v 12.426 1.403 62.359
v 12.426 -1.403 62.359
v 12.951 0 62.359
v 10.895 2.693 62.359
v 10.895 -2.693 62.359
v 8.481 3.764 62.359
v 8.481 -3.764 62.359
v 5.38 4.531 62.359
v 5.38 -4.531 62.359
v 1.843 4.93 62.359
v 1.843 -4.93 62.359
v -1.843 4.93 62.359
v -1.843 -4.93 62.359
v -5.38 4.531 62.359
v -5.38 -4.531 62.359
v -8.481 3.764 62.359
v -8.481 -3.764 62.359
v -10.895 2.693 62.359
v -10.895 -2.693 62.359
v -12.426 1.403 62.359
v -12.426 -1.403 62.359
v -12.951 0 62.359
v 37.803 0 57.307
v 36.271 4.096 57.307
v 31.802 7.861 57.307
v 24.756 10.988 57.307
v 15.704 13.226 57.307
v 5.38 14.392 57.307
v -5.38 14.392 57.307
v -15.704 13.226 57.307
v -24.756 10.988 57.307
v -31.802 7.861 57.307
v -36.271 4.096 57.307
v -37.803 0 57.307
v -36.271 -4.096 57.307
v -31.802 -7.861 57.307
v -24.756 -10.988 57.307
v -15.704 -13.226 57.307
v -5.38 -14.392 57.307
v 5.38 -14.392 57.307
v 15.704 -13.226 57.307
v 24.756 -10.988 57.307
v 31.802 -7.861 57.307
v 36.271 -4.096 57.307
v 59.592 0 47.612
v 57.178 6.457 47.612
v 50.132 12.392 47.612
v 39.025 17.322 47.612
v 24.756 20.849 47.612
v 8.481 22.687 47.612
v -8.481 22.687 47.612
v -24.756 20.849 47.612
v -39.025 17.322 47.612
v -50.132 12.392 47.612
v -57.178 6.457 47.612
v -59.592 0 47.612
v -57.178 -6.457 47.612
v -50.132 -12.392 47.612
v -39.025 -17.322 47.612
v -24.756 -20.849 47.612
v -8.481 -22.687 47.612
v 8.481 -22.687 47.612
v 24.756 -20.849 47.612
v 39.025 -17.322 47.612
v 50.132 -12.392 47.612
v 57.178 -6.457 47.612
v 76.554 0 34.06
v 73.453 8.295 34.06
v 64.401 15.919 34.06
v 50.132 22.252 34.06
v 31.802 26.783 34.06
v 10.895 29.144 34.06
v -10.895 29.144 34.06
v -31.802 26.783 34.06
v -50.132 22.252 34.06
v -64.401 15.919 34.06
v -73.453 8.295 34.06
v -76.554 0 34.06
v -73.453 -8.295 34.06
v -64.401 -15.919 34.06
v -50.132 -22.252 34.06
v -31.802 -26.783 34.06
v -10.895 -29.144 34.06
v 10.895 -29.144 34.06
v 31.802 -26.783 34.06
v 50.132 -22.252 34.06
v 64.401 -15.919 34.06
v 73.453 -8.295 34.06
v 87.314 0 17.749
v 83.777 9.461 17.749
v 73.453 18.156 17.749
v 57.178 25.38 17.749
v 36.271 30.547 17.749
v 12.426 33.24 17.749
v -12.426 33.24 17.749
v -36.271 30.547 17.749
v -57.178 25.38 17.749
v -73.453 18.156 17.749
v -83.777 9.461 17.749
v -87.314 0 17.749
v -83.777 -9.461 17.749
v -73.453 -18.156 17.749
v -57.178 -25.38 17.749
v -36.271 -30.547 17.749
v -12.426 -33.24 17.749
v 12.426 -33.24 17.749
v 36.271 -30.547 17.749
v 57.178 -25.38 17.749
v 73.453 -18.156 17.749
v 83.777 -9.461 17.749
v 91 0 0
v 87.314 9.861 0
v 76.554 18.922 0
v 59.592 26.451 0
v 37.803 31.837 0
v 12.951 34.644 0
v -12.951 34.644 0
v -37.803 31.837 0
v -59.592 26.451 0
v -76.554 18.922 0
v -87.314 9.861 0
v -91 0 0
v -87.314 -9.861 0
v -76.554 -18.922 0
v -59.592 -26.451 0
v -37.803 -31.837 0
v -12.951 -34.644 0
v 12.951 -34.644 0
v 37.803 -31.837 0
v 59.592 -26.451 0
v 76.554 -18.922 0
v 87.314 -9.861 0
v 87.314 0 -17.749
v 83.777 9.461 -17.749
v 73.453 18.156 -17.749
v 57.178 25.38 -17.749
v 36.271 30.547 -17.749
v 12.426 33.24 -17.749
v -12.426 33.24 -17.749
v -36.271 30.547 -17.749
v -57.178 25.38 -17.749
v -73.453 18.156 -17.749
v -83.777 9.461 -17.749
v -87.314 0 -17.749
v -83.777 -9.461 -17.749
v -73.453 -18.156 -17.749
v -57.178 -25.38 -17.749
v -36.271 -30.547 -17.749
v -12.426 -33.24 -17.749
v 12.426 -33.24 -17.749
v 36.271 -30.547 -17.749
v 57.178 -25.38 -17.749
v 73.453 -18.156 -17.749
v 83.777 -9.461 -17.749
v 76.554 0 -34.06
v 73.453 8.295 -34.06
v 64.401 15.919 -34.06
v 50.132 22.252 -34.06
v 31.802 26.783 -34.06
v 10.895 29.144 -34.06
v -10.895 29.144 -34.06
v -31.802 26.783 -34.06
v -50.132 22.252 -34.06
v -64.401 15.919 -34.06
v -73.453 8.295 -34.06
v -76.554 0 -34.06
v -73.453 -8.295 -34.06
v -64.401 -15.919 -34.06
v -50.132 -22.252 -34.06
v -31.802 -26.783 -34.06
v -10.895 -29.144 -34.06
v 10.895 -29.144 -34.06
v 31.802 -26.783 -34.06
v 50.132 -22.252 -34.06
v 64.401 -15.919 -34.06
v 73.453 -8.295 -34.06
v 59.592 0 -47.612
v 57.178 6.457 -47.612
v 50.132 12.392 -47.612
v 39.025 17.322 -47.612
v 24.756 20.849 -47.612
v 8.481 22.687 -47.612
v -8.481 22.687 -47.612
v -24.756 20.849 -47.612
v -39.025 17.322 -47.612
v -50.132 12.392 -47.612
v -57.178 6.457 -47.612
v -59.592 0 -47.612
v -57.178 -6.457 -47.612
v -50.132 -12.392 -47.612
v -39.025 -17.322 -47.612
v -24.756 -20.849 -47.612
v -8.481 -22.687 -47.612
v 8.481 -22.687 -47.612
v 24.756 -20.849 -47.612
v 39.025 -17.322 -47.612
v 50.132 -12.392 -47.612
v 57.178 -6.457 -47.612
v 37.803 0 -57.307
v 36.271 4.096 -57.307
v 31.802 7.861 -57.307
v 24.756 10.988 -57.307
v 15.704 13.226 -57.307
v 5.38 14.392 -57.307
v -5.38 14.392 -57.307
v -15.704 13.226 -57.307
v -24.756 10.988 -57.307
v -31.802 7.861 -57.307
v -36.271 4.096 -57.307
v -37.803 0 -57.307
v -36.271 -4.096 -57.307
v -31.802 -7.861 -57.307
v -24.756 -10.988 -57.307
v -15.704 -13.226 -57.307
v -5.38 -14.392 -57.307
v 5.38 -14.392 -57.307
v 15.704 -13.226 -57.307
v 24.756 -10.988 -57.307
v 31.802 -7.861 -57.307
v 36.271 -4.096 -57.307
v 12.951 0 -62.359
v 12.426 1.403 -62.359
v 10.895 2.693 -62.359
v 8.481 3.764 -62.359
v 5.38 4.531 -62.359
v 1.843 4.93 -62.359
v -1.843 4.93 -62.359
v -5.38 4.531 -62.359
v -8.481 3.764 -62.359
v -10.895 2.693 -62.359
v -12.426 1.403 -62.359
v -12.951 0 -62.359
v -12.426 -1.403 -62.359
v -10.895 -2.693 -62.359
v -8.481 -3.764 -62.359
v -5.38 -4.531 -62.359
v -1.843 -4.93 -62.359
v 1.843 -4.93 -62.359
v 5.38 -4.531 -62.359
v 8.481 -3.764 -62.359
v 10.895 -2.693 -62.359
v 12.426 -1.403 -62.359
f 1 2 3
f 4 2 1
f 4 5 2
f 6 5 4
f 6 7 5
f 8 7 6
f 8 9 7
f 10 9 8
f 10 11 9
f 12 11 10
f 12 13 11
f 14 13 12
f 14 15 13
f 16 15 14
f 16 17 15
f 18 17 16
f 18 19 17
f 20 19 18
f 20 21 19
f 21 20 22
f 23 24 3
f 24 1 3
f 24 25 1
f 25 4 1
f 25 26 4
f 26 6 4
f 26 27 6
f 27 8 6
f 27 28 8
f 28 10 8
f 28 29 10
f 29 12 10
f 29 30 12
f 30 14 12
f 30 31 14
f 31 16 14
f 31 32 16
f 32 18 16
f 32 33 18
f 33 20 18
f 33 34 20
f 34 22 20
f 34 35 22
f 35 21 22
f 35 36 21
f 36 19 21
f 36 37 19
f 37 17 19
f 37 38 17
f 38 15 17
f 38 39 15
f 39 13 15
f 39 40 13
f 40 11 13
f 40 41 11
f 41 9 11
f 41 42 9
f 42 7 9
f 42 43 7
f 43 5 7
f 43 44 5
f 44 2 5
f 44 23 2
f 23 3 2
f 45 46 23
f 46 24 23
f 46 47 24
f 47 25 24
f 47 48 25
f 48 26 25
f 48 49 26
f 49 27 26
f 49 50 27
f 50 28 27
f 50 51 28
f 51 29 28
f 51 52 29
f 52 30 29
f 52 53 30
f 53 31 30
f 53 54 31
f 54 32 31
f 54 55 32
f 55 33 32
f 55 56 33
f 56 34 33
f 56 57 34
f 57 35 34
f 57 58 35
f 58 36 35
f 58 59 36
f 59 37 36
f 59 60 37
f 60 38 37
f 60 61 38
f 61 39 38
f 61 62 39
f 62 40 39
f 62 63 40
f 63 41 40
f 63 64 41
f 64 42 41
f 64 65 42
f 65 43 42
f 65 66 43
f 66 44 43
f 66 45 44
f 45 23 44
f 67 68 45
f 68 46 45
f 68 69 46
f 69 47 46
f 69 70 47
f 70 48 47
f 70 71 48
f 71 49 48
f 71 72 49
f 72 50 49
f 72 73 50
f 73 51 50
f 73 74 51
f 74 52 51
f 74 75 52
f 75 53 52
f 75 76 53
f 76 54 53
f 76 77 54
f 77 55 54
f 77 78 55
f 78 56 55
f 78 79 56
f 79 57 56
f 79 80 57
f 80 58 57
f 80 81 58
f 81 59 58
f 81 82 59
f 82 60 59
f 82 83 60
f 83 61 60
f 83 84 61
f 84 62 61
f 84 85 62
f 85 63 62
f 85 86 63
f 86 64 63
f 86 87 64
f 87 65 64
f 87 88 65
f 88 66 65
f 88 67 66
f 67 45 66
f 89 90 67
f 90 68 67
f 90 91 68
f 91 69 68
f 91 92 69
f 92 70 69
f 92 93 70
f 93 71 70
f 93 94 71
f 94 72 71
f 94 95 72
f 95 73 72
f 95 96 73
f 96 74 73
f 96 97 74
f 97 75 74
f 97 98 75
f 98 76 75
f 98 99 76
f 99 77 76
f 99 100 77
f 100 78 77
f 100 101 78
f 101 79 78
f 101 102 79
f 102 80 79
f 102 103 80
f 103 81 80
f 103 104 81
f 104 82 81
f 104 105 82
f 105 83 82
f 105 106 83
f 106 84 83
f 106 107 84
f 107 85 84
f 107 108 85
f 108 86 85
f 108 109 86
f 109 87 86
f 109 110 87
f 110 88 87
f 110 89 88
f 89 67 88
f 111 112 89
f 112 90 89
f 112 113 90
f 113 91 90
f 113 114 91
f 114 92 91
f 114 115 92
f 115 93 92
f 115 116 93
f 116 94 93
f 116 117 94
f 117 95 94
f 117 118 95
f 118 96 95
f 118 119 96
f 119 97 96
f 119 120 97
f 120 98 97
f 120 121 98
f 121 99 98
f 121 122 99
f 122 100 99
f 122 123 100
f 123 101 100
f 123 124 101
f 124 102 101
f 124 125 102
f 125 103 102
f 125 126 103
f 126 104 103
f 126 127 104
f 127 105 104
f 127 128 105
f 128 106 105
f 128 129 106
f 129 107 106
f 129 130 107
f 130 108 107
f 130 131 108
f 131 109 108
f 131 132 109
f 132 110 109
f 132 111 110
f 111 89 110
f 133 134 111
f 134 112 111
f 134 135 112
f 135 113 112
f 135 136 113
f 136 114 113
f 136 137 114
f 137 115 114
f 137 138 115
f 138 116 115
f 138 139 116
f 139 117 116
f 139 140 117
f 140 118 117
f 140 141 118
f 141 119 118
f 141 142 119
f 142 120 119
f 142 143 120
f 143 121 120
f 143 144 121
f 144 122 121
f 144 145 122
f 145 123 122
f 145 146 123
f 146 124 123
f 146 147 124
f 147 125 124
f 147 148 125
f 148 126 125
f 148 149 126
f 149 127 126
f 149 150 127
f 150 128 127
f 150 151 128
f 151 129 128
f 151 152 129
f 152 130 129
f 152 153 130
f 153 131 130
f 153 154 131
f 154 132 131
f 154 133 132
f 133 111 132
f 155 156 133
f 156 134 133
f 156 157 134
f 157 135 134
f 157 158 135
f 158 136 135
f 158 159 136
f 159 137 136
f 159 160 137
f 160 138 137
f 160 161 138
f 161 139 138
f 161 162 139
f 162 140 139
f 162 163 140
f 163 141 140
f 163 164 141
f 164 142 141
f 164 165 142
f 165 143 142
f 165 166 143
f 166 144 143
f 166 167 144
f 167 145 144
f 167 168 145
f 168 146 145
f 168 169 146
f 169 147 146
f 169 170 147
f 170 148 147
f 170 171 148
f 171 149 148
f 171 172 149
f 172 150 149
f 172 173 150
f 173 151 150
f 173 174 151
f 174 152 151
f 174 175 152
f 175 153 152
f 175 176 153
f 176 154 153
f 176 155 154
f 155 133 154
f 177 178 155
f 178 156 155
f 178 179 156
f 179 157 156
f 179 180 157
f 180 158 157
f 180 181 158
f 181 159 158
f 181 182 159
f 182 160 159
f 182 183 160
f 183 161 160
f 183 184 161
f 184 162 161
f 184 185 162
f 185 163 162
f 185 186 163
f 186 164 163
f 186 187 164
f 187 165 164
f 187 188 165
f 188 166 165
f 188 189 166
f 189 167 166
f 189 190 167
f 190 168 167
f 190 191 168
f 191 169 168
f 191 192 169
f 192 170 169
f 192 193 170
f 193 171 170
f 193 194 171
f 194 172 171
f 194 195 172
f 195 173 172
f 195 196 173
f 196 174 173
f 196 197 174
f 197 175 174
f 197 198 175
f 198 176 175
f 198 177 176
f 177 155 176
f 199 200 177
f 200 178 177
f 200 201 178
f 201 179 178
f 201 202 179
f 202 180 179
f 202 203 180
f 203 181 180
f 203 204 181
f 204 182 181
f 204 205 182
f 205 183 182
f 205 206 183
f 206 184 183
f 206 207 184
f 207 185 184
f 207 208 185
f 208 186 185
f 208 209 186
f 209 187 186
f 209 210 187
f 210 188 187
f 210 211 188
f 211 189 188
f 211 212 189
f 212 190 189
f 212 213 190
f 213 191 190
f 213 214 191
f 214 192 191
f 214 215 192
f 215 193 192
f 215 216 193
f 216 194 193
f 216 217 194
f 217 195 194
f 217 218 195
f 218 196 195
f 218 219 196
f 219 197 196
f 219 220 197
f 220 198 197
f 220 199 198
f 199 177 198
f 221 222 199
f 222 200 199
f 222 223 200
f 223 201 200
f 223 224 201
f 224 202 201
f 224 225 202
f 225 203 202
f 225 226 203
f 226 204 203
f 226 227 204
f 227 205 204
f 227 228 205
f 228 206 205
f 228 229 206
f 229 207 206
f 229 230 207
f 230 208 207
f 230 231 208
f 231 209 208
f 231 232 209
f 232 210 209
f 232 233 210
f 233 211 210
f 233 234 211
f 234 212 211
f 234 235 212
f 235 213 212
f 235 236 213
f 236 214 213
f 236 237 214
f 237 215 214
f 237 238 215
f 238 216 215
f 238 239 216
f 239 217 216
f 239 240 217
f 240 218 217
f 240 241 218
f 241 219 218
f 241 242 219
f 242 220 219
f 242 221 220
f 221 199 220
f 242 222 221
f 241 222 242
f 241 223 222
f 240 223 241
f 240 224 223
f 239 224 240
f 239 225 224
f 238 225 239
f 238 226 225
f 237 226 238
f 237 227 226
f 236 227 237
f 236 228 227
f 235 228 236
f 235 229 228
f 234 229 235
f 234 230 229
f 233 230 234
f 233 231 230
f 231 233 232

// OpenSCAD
// Generated by SolidPython 1.0.1 on 2020-07-29 00:46:50


scale(v = [13, 5, 9]) {
	sphere(r = 7);
}
/***********************************************
*********      SolidPython code:      **********
************************************************
 
# import packages: SolidPython
from solid import *
from solid.utils import *
from itertools import chain, combinations, permutations


class Resize:

    def __init__(self, scad_file):
        self.scad_file = scad_file
        #self.scad_file = import_scad(scad_file)
        # cone/cylinder param:
        self.r1 = 0
        self.r2 = 0
        self.h = 0
        # rectangular prism param:
        self.w = 0
        self.l = 0
        # ellipse param:
        self.r = 0

    # import OpenScad code (file name corresponds to shape)


    # classify shape + parameters
    def assign(self, param1, param2, param3):
        if self.scad_file == 'cone.scad':
            self.r1 = param1
            self.r2 = param2
            self.h = param3
        elif self.scad_file == 'cylinder.scad':
            self.r1 = param1
            self.r2 = param2
            self.h = param3
        elif self.scad_file == 'rectangularPrism.scad':
            self.h = param1
            self.l = param2
            self.w = param3
        else:
            self.r = param1
            self.h = param2

    # resize parameters
    def iterate(self):
        x = range(3, 20, 2)
        i = 1
        if self.scad_file == 'cone.scad':
            tempList = list(permutations(x, 2))
            for temp in tempList:
                param1 = temp[0]
                param2 = temp[1]
                filepath = 'produced_scad_files/' + 'cone' + str(param1) + '_' + str(param2) + '_' + '.scad'
                scad_render_to_file(cylinder(h=param1, r1=param2, r2=0), filepath)

        elif self.scad_file == 'cylinder.scad':
            tempList = list(permutations(x, 3))
            for temp in tempList:
                param1 = temp[0]
                param2 = temp[1]
                filepath = 'produced_scad_files/' + 'cylinder' + str(param1) + '_' + str(param2) + '_' + '.scad'
                scad_render_to_file(cylinder(h=param1, r1=param2, r2=param2), filepath)

        elif self.scad_file == 'rectangularPrism.scad':
            tempList = list(permutations(x, 3))
            for temp in tempList:
                param1 = temp[0]
                param2 = temp[1]
                param3 = temp[2]
                filepath = 'produced_scad_files/' + 'rectangularPrism' + str(param1) + '_' + str(param2) + '_' + str(
                    param3) + '.scad'
                scad_render_to_file(cube(size=(param1, param2, param3)), filepath)

        elif self.scad_file == 'ellipse.scad':
            tempList = list(permutations(x, 4))
            for temp in tempList:
                param1 = temp[0]
                param2 = temp[1]
                param3 = temp[2]
                param4 = temp[3]
                filepath = 'produced_scad_files/' + 'ellipse' + str(param1) + '_' + str(param2) + '_' + str(param3) + '_' + str(param4) + '.scad'
                scad_render_to_file(scale([param1, param2, param3])(sphere(r=param4)), filepath)

    def render_to_scadfile(self):
        scad_render_to_file(scad, 'example.scad') 
 
************************************************/
